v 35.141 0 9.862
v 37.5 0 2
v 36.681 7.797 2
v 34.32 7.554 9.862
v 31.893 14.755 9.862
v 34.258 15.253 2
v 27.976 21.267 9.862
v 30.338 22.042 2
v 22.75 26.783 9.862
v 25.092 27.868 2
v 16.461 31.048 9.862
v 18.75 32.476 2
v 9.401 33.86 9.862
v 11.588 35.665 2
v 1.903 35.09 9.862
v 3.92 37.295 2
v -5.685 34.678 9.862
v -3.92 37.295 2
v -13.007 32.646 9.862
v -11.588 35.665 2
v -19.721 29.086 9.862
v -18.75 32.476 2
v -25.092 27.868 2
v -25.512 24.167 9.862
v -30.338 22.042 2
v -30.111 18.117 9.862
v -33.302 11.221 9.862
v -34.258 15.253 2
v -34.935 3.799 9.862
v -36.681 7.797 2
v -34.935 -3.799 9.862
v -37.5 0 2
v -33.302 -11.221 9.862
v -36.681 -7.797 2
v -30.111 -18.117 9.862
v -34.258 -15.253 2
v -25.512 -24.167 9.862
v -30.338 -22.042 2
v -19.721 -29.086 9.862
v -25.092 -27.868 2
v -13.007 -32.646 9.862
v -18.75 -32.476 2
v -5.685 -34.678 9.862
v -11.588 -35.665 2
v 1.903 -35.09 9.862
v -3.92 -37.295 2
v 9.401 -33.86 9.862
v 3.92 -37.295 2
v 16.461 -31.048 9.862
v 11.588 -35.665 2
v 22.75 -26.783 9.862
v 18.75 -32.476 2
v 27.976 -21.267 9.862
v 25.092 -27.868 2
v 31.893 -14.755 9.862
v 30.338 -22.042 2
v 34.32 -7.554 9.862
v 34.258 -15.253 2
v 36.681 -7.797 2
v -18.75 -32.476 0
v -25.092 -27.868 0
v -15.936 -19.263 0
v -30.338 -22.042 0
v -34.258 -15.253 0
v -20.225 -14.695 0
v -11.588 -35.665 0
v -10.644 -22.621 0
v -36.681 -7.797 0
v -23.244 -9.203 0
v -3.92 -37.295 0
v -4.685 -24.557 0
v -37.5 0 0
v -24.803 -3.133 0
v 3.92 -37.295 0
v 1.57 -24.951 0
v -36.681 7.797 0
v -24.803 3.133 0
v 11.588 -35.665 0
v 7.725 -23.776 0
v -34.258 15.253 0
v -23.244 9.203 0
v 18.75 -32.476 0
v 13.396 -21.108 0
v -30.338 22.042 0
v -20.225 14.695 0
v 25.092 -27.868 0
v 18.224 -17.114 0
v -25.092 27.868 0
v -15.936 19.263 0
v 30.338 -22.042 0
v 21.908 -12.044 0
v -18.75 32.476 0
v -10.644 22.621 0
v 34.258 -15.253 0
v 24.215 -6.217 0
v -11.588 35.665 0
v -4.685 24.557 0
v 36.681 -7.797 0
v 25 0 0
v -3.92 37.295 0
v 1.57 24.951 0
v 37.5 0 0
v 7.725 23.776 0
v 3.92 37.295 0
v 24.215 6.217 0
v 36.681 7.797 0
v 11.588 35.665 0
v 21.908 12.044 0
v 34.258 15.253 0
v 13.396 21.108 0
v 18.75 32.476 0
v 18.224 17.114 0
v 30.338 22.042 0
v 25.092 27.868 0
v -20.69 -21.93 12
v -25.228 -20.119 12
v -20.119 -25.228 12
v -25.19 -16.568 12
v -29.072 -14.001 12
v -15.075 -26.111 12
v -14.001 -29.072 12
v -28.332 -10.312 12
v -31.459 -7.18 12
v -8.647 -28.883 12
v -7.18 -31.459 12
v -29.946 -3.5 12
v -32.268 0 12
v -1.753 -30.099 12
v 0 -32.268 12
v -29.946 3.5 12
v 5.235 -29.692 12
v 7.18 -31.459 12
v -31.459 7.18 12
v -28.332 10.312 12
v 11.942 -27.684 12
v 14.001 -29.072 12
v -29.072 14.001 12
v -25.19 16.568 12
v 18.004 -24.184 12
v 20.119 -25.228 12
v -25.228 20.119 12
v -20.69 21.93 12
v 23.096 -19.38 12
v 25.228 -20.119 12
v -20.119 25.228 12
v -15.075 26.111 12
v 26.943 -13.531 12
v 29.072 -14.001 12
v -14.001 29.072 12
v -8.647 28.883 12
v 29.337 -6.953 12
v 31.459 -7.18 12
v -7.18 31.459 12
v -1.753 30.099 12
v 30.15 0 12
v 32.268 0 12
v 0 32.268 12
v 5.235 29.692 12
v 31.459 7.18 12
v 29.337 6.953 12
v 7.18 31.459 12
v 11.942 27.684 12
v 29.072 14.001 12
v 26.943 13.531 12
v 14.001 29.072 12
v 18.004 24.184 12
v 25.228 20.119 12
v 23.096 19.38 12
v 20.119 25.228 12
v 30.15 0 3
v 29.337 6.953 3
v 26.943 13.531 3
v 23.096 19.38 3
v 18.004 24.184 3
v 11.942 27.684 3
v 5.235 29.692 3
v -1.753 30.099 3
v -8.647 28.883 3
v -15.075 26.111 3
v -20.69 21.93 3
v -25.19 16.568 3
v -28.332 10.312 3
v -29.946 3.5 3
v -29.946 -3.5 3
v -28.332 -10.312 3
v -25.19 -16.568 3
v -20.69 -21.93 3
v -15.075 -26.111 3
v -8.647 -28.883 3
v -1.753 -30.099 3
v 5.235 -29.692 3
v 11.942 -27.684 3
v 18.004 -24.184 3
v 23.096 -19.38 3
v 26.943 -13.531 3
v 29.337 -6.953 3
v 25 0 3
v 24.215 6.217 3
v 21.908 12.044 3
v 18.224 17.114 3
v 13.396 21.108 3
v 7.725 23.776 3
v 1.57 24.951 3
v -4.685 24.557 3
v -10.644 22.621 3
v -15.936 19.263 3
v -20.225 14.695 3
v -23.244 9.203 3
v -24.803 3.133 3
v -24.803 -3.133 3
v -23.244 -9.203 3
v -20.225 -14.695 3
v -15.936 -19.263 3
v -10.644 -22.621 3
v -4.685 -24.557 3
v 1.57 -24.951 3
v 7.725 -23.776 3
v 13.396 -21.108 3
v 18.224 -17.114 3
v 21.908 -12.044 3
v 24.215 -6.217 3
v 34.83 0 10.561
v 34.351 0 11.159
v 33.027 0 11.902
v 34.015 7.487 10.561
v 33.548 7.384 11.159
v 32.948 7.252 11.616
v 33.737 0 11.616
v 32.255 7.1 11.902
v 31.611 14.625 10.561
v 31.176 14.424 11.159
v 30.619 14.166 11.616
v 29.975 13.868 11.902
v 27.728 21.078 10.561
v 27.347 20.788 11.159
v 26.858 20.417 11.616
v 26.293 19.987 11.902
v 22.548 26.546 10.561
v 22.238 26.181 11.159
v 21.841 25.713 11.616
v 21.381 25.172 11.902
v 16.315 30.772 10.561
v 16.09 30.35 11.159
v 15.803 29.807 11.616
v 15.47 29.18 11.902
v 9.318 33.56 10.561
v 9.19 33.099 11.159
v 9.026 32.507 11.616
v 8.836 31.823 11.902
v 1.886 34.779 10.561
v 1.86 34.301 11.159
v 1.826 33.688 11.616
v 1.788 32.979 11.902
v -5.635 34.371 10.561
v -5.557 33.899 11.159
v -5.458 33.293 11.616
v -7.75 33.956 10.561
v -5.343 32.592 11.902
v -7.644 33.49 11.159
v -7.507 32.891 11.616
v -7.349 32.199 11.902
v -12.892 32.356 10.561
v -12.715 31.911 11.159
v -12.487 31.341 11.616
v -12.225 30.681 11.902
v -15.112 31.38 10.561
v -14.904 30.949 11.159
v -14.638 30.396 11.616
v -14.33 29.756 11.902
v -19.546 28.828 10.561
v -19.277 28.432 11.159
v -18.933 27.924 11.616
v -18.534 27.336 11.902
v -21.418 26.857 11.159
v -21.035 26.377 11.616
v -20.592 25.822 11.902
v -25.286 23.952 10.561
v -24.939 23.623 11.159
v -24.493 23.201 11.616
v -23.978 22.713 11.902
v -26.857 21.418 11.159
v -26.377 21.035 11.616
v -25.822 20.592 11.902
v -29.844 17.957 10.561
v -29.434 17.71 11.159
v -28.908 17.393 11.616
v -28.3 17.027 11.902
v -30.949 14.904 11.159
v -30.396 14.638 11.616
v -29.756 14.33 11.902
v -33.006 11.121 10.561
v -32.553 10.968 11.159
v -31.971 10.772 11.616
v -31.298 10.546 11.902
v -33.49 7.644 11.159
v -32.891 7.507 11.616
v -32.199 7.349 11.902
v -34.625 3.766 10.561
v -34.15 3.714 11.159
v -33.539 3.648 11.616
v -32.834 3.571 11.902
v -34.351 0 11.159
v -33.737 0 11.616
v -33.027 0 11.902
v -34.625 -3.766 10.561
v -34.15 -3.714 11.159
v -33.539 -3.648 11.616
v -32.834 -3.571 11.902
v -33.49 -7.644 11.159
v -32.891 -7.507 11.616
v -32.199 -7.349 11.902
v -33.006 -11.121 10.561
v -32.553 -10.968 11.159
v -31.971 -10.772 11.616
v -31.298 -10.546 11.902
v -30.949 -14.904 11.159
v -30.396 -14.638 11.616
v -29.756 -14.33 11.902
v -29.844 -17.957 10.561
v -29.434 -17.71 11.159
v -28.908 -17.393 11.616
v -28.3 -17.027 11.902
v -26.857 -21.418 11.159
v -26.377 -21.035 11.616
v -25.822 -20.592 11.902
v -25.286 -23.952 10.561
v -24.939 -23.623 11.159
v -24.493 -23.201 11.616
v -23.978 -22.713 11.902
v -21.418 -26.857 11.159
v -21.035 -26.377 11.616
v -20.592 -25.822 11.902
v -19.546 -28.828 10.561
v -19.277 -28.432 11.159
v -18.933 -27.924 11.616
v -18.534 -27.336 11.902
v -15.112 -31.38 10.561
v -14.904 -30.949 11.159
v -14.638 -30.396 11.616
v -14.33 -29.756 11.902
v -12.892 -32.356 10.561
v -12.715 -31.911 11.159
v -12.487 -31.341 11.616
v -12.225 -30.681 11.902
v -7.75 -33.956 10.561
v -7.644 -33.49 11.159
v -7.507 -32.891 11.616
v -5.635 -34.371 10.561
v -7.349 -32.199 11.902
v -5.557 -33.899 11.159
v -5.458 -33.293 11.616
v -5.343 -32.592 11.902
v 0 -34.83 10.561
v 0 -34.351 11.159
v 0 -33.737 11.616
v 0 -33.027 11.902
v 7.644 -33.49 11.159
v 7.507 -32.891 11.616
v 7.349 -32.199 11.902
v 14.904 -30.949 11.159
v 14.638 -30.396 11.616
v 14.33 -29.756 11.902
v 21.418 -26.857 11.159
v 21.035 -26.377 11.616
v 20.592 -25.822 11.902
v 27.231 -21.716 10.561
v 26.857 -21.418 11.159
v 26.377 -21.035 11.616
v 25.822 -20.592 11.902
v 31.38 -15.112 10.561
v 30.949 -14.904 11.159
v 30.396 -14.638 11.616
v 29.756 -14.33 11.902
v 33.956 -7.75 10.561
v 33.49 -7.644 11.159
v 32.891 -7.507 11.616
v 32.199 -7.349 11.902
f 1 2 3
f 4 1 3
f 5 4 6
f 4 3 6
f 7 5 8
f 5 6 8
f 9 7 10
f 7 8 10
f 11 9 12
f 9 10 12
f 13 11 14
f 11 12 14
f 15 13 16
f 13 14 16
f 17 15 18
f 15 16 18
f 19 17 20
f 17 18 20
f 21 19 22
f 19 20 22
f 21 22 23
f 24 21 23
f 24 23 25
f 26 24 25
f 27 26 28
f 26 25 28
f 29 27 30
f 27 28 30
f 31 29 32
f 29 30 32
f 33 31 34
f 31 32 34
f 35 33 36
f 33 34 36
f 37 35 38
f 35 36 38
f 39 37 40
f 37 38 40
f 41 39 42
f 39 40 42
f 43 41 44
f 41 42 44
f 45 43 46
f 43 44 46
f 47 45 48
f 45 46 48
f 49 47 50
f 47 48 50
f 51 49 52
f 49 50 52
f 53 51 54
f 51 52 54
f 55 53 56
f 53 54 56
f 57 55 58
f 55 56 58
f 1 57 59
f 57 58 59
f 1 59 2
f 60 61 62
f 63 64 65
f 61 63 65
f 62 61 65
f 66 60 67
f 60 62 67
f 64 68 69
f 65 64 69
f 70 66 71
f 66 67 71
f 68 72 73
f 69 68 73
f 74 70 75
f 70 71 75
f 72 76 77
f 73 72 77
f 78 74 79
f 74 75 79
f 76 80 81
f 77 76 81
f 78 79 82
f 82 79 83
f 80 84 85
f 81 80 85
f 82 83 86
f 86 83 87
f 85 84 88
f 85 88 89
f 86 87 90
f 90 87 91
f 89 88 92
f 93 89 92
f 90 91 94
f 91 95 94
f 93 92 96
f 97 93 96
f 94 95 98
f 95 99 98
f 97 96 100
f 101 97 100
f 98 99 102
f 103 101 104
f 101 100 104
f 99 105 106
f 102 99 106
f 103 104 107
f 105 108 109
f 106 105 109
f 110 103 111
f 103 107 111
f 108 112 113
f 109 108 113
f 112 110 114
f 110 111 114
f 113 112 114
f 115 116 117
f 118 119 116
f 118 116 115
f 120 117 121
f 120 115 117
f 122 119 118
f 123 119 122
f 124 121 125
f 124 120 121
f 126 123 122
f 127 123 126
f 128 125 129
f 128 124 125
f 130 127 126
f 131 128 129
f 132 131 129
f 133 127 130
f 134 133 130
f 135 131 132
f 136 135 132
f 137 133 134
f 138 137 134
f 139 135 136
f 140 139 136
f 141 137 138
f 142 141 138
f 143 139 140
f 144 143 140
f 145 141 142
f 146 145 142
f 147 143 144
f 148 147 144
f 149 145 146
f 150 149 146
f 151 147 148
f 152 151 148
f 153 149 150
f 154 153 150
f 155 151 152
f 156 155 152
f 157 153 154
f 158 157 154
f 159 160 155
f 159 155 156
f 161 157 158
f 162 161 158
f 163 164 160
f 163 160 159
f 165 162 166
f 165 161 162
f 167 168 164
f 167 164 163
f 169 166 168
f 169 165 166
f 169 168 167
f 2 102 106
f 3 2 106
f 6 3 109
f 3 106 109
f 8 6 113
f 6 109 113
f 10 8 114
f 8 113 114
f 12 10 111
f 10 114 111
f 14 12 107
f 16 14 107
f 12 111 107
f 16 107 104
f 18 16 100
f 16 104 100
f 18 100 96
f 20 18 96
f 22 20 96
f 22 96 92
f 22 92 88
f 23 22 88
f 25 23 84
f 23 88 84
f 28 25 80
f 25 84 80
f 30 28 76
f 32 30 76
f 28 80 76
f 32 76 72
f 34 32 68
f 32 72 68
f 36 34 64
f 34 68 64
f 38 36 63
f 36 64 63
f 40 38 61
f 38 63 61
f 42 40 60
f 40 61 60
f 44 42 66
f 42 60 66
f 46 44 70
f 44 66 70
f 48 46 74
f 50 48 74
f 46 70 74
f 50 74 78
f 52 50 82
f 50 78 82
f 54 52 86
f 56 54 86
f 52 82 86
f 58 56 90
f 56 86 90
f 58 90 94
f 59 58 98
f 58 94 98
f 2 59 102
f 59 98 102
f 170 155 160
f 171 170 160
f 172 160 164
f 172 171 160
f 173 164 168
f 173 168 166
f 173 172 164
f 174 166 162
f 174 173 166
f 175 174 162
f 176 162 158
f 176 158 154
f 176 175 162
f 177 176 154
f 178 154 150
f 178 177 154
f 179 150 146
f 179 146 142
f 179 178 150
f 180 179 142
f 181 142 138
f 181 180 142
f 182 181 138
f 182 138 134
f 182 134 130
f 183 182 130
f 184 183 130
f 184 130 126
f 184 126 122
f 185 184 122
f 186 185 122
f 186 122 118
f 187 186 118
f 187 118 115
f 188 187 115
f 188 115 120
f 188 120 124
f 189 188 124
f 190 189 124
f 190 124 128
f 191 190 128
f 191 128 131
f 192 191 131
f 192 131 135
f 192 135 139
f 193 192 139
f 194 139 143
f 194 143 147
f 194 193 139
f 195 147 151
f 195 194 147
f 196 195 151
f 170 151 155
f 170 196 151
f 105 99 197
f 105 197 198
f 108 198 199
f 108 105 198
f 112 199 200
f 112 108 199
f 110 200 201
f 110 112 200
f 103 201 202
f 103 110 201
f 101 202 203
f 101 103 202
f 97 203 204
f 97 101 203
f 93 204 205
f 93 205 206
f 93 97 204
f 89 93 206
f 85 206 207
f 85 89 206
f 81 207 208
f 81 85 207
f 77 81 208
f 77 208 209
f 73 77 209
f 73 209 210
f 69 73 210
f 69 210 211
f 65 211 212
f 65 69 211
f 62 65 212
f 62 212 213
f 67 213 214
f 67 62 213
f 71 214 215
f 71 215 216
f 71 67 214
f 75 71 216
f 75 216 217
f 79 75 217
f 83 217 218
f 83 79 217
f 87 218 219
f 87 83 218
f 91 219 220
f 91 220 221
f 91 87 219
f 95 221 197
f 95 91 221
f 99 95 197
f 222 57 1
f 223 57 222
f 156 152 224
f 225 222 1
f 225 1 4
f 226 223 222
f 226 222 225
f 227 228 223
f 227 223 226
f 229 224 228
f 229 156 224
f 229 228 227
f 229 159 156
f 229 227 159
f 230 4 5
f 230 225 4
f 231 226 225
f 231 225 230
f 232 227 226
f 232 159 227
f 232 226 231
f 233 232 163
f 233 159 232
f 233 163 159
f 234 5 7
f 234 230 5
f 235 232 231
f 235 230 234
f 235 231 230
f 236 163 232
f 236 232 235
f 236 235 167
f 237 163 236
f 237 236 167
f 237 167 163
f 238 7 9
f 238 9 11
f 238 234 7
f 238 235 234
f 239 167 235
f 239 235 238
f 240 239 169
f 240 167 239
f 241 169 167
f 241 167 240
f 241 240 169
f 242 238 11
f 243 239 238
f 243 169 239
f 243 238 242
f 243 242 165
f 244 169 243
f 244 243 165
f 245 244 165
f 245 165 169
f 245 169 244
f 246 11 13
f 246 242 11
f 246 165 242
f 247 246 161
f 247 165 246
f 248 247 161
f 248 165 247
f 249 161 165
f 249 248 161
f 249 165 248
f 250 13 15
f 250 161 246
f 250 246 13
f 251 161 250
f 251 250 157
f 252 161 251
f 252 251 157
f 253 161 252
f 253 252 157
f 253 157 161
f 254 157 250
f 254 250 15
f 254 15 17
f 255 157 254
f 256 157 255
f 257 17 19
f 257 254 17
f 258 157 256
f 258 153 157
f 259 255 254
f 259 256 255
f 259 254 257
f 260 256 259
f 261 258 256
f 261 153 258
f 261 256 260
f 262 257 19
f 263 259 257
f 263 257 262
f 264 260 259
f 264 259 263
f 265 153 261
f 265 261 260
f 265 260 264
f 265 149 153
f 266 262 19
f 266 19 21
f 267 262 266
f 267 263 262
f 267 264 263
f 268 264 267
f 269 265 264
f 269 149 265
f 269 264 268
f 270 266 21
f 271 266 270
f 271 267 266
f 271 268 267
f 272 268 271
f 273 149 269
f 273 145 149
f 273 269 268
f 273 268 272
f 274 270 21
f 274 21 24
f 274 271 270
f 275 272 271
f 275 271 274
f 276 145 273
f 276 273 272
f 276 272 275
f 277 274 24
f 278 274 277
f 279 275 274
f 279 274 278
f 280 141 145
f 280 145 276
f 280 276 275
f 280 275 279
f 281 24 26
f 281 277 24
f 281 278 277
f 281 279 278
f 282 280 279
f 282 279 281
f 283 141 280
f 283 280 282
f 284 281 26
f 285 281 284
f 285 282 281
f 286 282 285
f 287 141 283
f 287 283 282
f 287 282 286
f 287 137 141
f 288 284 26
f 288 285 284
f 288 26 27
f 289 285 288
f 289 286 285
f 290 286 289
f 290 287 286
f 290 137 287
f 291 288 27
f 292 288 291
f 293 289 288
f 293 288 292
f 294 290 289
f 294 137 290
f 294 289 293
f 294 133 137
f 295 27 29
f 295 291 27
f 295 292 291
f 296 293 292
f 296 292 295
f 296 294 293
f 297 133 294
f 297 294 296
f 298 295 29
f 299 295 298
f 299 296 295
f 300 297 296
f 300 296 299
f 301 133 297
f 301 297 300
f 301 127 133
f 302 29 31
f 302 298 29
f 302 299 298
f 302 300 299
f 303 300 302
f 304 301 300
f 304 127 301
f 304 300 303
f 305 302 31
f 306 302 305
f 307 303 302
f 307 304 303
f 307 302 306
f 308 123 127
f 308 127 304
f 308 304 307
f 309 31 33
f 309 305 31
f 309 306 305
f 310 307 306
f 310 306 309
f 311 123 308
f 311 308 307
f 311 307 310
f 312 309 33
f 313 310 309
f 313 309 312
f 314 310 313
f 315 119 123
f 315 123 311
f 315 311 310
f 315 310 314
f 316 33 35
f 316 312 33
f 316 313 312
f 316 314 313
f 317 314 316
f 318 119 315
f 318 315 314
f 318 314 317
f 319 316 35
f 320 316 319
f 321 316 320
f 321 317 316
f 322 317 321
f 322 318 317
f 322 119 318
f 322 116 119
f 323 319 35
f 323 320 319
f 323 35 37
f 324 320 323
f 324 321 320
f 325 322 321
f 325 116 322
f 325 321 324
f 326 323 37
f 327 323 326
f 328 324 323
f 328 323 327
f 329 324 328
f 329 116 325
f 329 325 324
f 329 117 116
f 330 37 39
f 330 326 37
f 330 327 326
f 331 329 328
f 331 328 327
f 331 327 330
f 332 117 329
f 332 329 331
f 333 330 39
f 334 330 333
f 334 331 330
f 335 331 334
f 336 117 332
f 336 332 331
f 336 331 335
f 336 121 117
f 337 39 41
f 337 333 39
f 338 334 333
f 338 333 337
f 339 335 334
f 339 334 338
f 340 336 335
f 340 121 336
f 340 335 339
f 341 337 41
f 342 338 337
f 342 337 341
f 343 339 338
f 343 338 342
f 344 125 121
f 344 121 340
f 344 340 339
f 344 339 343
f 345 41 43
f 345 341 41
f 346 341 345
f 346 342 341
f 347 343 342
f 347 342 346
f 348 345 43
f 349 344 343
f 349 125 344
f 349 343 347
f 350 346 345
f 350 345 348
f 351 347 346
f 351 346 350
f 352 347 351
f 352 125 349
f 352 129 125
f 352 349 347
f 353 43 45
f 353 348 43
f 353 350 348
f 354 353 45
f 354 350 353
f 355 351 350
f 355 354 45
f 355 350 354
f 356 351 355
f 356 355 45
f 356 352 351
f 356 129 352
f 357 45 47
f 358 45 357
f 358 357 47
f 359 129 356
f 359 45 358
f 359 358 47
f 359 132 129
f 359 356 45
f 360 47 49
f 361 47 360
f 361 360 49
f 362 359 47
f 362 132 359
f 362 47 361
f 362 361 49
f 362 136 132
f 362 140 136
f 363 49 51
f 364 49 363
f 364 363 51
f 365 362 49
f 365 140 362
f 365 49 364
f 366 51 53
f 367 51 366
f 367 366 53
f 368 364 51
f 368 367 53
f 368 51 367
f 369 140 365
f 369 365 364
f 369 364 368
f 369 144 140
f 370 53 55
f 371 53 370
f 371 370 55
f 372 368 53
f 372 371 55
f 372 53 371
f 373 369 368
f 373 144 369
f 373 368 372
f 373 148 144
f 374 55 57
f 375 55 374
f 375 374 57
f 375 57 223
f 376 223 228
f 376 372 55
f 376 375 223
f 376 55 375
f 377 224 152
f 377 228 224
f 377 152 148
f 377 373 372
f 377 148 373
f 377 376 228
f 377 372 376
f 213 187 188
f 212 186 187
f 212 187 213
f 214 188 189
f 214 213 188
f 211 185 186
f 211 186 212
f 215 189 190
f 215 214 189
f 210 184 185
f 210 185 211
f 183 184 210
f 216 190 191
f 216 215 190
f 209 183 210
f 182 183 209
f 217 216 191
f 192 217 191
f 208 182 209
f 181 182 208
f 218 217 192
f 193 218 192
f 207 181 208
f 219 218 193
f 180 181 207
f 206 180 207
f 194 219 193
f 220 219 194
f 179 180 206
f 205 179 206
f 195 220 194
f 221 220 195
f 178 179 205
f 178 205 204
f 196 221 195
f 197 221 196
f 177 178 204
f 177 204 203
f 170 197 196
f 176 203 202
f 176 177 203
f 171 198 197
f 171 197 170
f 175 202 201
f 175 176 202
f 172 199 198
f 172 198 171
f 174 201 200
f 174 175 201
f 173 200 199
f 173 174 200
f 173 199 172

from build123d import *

# Parameters (mm, degrees)
F0_R     = 37.5
F0_R_2   = 30.15
F0_R_3   = 25
F1_DEPTH = 3
F2_DEPTH = 12
F3_SIZE2 = 10
F3_SIZE  = 3
F4_R     = 3


with BuildPart() as f1:
    # F0 (on Top) → F1 (new body)
    with BuildSketch(Plane.XY):
        Circle(F0_R)
        Circle(F0_R_2, mode=Mode.SUBTRACT)
        Circle(F0_R_2)
        Circle(F0_R_3, mode=Mode.SUBTRACT)
    extrude(amount=F1_DEPTH)

    # F0 (on Top) → F2 (join)
    with BuildSketch(Plane.XY):
        Circle(F0_R)
        Circle(F0_R_2, mode=Mode.SUBTRACT)
    extrude(amount=F2_DEPTH)

    # F3
    f3_edges = [f1.edges().sort_by_distance(p)[0] for p in [
        (-37.5, 0, 12),
    ]]
    f3_side = f1.faces().sort_by_distance((-36.43934, 0, 12))[0]
    chamfer(f3_edges, length=F3_SIZE, length2=F3_SIZE2, reference=f3_side)

    # F4
    f4_edges = [f1.edges().sort_by_distance(p)[0] for p in [
        (-34.5, 0, 12),
    ]]
    fillet(f4_edges, radius=F4_R)


solid = f1.part
